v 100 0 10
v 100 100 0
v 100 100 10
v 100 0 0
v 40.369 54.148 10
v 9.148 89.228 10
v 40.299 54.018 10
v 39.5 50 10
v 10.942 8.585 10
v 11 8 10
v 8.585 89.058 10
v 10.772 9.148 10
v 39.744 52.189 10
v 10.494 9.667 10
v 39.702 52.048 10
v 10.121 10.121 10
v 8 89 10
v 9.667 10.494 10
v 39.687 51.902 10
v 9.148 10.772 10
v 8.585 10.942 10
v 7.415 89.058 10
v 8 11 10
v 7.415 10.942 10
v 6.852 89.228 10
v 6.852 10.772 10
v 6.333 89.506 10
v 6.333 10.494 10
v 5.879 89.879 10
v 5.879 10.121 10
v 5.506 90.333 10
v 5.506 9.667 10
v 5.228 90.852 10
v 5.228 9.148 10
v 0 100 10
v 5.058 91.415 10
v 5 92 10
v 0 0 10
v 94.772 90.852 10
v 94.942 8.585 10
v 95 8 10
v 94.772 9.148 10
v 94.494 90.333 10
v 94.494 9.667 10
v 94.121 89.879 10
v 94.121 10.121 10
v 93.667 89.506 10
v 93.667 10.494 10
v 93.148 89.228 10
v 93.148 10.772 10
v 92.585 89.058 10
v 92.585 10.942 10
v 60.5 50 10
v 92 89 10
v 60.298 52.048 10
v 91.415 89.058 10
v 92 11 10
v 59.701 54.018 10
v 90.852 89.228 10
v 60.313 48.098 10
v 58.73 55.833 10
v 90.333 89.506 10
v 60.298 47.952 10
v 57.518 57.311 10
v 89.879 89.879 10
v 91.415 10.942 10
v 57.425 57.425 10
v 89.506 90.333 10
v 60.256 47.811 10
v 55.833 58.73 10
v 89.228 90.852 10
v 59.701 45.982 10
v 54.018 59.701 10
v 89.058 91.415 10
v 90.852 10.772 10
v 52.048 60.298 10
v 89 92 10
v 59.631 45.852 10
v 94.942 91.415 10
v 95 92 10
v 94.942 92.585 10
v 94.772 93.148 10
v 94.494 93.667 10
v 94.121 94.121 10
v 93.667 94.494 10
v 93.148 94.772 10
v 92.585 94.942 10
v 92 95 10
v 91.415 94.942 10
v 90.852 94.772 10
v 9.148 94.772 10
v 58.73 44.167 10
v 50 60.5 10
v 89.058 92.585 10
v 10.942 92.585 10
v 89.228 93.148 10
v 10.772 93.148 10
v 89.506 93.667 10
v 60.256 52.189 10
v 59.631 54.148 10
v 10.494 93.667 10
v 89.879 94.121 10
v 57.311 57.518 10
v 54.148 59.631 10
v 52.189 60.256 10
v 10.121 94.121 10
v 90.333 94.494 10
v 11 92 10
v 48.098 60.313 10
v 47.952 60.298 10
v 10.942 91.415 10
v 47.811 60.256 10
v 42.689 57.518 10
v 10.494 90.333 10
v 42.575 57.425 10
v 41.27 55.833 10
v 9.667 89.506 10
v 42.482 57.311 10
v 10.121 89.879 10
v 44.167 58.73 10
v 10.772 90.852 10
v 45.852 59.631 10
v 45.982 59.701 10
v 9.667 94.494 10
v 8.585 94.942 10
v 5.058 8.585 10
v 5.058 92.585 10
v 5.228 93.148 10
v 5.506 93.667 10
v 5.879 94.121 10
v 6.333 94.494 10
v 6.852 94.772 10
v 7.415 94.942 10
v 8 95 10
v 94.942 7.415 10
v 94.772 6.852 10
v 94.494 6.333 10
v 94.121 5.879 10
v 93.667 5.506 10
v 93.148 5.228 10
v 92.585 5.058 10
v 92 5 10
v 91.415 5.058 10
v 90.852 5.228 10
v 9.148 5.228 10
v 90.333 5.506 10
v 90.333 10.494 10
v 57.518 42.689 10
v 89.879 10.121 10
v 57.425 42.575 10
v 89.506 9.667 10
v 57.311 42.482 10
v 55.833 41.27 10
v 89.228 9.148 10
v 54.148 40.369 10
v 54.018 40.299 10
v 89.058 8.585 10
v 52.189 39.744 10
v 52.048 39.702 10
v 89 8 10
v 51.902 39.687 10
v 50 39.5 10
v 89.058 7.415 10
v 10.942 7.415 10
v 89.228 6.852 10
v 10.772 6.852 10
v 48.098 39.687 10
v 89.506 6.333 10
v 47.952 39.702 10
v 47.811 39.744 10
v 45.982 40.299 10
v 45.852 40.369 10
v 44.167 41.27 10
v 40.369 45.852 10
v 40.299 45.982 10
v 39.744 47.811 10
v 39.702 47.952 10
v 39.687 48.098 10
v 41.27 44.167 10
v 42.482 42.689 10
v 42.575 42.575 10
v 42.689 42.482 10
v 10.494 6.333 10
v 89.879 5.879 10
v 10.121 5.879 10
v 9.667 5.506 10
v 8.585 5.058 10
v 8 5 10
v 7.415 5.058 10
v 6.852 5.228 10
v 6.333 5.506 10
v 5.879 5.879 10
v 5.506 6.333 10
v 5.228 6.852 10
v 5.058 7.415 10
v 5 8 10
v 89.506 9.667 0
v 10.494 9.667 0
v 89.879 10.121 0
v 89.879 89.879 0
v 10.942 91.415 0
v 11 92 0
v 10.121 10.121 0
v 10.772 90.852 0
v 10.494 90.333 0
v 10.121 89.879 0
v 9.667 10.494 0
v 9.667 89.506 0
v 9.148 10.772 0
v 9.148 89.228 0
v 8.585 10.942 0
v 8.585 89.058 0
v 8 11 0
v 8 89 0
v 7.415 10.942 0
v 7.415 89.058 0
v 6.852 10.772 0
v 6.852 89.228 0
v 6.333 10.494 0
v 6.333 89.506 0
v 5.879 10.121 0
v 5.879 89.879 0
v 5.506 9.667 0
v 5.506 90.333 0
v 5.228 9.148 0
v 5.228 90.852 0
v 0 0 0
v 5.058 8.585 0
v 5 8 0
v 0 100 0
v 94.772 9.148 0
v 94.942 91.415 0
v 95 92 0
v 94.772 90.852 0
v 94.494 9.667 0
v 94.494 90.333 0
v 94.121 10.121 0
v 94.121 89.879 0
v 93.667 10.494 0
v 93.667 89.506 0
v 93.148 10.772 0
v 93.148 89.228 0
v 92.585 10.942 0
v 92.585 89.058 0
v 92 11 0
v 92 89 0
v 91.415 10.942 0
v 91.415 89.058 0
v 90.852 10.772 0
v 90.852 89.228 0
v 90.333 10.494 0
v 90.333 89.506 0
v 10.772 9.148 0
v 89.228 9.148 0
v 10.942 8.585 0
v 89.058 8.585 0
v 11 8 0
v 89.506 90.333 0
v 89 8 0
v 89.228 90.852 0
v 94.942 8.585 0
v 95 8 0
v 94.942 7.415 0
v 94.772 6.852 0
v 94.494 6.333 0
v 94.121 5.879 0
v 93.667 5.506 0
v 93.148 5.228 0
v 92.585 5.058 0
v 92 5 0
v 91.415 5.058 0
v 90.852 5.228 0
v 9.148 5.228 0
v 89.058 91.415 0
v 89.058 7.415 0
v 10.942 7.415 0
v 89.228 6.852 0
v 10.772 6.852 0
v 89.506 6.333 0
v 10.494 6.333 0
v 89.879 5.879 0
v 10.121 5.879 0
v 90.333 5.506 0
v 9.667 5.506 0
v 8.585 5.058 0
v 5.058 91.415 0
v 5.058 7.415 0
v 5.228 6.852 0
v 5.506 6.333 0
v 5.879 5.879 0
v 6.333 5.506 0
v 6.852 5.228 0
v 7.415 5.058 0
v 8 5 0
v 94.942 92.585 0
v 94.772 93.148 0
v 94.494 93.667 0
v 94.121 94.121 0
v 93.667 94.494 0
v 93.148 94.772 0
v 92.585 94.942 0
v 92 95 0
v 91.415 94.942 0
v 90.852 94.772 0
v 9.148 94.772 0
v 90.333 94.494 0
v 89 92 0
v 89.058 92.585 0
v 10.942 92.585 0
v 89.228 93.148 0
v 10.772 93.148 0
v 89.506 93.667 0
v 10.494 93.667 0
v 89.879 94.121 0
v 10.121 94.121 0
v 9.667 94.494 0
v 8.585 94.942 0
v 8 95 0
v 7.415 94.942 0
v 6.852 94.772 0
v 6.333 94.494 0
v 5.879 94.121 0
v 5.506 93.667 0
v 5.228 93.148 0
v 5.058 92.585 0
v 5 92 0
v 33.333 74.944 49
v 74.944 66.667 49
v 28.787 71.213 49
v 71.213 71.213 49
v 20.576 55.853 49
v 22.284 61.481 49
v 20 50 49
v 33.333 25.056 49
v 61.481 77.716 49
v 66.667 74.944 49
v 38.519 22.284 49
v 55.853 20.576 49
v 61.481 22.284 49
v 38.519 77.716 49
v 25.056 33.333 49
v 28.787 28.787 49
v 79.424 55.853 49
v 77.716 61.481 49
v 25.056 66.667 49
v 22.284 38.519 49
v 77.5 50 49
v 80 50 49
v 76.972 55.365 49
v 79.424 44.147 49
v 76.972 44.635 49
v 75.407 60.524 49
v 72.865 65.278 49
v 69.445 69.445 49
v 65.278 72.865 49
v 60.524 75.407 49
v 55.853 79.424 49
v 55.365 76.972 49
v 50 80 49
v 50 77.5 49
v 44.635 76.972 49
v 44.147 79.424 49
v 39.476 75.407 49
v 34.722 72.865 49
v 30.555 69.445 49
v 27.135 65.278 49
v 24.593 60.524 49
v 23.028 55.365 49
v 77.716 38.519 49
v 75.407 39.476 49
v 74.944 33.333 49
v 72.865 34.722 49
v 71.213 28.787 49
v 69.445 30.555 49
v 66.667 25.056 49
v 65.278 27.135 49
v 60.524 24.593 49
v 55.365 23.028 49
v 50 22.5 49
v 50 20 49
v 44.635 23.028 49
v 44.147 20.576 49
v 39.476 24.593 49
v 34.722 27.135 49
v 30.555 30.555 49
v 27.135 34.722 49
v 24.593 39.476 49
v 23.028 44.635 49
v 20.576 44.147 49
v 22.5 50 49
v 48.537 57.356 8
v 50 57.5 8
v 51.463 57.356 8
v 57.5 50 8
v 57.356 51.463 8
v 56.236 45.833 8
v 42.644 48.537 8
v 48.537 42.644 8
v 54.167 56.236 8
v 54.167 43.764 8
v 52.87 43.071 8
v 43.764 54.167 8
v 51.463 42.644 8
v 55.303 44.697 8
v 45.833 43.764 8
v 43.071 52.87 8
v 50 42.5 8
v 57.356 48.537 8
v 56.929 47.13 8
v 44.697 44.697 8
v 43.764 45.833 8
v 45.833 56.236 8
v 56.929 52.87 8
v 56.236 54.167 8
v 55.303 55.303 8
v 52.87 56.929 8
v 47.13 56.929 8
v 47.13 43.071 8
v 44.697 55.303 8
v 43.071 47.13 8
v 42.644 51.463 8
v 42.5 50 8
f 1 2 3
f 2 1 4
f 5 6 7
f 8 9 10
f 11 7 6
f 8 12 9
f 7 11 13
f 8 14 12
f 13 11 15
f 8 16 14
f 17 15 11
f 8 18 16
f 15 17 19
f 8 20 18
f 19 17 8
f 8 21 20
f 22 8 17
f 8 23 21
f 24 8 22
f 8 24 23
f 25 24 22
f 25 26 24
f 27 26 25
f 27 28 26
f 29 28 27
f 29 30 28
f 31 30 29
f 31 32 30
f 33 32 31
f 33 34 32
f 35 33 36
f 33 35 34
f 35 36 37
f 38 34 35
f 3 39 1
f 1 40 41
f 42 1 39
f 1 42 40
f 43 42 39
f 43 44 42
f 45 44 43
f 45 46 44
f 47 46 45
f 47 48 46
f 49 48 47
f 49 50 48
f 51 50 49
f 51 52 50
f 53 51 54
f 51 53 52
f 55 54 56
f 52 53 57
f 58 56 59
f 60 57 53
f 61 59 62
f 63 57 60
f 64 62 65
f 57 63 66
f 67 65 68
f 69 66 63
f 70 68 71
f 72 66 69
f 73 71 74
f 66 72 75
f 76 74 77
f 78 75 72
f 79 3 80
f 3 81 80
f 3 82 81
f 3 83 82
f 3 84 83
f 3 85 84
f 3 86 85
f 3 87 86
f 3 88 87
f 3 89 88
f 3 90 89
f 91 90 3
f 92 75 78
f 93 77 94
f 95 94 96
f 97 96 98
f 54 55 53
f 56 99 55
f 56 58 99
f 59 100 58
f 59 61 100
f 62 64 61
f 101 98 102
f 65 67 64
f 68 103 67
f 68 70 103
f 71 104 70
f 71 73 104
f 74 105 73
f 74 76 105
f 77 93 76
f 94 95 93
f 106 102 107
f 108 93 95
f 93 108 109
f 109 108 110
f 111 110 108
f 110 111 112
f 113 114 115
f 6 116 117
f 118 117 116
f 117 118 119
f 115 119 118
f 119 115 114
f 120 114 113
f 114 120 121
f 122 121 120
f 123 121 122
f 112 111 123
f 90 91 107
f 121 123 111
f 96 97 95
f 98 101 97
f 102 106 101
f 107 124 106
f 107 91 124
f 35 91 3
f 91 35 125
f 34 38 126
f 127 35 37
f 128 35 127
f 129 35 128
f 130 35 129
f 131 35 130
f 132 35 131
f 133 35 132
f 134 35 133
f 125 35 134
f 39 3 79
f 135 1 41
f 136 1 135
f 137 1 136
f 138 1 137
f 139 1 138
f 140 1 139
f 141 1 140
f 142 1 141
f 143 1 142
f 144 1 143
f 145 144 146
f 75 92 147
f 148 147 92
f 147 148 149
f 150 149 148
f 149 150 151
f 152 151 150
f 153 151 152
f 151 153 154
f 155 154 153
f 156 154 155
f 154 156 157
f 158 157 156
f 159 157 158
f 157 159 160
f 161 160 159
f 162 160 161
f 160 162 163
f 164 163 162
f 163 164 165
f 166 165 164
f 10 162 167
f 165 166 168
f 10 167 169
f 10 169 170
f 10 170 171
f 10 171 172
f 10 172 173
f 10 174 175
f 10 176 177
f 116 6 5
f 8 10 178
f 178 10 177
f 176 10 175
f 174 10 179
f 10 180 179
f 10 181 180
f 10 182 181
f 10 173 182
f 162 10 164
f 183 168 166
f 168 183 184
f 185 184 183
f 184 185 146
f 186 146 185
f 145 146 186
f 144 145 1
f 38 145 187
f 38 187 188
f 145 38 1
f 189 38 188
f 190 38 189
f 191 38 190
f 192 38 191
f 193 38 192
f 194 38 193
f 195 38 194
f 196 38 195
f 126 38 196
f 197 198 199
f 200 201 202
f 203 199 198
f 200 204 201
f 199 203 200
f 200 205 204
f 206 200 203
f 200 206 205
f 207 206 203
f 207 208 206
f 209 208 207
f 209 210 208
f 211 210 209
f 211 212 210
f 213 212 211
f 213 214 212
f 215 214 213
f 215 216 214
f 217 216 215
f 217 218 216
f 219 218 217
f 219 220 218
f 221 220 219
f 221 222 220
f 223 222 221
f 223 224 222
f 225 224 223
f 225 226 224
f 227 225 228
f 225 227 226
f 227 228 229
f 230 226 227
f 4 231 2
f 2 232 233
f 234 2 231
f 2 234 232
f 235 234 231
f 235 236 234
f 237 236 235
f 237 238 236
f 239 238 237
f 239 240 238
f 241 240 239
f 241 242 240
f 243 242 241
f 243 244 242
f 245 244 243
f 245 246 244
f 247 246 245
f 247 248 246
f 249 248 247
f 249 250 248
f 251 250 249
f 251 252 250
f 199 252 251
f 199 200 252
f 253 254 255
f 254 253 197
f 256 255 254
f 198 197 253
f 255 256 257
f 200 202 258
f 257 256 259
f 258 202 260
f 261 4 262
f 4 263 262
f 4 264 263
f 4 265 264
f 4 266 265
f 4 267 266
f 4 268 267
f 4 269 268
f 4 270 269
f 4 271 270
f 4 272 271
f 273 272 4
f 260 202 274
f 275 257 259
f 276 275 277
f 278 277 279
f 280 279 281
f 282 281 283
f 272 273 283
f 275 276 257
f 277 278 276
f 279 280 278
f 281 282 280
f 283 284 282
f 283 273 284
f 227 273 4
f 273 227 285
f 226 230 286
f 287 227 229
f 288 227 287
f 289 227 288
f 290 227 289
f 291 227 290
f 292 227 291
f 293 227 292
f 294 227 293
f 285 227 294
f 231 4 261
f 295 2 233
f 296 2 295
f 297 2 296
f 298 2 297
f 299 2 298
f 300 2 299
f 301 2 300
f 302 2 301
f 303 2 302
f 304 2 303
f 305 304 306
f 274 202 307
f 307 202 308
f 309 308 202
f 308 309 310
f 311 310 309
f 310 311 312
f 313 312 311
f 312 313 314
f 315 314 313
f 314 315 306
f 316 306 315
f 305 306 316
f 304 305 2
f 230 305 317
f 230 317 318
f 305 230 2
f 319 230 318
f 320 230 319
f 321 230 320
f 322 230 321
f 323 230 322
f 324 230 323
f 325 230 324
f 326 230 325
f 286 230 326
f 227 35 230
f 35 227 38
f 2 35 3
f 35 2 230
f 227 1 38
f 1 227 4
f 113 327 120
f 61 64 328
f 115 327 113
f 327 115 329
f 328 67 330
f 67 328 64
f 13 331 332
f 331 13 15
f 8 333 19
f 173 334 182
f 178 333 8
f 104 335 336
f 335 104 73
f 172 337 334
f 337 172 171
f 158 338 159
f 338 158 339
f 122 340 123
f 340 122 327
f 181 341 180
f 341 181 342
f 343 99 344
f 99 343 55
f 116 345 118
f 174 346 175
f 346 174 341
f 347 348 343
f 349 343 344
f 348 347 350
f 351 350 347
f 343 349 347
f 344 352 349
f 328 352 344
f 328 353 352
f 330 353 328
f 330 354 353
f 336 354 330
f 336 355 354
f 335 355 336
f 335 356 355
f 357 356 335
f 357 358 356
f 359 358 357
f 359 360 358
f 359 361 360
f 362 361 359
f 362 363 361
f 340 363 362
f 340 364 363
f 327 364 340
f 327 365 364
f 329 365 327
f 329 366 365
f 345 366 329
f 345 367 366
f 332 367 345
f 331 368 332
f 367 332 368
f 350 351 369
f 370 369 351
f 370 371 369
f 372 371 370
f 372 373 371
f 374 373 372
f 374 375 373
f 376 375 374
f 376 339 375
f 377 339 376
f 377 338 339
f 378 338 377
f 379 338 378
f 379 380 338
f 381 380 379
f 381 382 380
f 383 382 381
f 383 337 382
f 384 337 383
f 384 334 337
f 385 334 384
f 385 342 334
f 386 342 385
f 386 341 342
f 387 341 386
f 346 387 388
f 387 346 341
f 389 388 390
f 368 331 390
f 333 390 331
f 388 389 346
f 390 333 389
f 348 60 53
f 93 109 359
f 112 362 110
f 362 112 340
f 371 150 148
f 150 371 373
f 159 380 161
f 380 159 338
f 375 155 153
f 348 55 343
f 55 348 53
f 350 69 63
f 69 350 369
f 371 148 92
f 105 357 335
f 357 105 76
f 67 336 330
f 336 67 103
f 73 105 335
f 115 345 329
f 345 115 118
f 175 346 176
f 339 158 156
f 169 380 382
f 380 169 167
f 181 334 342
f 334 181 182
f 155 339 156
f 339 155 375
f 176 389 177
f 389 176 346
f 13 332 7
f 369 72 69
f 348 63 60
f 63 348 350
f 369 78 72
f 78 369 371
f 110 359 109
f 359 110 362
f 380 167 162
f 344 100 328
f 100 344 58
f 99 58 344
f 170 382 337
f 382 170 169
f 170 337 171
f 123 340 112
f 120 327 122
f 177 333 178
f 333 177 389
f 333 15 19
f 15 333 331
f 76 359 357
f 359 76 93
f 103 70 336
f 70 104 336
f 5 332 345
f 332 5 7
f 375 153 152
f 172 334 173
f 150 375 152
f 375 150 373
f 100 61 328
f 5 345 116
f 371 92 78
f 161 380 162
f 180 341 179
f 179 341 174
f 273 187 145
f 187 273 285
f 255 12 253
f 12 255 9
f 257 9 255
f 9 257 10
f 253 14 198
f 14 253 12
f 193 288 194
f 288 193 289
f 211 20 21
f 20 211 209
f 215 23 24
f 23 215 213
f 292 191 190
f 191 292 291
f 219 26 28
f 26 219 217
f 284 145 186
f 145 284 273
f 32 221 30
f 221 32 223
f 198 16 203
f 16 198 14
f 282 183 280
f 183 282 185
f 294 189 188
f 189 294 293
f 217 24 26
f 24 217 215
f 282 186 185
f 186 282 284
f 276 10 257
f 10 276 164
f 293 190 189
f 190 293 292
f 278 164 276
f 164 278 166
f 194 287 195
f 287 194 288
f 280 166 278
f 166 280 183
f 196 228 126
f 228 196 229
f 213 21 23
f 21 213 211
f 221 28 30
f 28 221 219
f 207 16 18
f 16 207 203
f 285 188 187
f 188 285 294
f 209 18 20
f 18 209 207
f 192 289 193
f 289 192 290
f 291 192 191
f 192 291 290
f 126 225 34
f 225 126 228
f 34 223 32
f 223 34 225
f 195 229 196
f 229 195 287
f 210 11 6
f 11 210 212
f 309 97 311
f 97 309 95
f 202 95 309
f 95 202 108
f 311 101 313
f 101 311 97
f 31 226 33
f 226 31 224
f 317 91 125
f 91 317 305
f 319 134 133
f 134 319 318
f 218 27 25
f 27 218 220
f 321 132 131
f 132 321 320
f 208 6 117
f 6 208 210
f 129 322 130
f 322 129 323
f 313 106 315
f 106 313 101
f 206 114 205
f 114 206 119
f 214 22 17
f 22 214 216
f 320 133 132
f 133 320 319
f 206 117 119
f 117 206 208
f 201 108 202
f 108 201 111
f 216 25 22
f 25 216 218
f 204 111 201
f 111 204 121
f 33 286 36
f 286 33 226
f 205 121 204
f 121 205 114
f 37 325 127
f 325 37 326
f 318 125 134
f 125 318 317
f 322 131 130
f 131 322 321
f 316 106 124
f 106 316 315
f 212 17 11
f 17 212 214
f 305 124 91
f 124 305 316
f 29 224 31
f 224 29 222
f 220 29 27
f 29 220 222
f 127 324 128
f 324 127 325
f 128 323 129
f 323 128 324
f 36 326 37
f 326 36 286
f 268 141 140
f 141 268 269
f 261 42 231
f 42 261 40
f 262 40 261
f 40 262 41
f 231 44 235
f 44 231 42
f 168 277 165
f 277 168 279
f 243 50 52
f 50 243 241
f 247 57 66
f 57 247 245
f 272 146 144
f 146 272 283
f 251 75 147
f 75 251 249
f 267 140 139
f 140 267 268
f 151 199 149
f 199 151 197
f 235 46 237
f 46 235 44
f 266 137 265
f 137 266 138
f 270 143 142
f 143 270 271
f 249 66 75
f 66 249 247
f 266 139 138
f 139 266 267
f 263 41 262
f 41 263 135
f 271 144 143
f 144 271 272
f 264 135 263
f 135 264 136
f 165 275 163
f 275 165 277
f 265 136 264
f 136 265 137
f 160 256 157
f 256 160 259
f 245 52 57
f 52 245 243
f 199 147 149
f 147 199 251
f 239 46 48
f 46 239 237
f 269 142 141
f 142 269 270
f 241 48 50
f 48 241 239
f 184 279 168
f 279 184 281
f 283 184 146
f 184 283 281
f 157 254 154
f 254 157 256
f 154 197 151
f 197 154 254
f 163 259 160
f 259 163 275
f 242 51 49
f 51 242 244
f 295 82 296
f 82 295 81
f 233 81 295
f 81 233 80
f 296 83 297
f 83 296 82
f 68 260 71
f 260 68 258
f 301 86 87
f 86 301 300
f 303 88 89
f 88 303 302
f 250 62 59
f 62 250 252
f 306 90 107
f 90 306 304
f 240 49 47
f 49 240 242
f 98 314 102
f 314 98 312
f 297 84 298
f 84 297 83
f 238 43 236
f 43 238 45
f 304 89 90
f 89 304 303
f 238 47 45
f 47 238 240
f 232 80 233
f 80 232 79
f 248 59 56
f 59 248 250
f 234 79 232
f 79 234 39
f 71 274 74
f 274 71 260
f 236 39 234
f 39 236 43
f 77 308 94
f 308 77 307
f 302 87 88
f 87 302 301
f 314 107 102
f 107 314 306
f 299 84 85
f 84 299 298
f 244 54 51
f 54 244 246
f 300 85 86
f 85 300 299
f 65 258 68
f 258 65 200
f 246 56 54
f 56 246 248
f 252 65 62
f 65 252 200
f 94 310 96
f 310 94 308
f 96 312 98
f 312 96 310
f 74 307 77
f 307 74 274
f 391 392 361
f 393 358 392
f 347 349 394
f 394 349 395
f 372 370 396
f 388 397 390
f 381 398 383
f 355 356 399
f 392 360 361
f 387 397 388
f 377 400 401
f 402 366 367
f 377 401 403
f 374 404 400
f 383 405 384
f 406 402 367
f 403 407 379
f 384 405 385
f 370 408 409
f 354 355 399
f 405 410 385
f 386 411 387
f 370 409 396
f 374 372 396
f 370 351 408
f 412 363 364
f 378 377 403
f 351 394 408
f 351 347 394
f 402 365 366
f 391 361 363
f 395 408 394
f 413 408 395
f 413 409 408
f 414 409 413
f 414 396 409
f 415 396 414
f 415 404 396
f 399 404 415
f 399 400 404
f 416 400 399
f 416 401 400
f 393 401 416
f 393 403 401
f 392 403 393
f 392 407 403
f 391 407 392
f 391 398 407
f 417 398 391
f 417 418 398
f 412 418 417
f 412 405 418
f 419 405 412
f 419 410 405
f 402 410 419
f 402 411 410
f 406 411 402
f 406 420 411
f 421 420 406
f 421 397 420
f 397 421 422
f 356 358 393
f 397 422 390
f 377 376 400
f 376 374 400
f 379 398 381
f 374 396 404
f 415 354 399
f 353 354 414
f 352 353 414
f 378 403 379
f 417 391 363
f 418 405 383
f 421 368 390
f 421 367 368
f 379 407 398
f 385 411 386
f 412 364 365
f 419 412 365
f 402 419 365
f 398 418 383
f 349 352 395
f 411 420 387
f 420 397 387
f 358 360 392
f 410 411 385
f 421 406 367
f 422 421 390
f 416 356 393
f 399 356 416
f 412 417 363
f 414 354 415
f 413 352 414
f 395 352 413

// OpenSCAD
$fn = 32;

// ----------------------------------------------------------------------
// Hopper: flanged with square flange
// ----------------------------------------------------------------------

// --- parameters (mm) ---
fl = 100;                 // flange side, X and Y
fl_t = 10;                // flange thickness
cone_h = 40;              // cone height above the flange
top_d = 60;               // cone mouth diameter
bot_d = 20;               // cone spout diameter
wall = 2.5;               // cone wall thickness
hole_r = 3;               // flange hole radius
hole_in = 8;              // hole inset from the corners

bore_d = bot_d - 2 * wall;  // spout bore diameter
total_h = fl_t + cone_h - 1;  // overall height

difference() {
  union() {
    cube([fl, fl, fl_t]);
    translate([fl / 2, fl / 2, fl_t - 1])
      cylinder(h = cone_h, d1 = bot_d, d2 = top_d);
  }
  translate([fl / 2, fl / 2, fl_t - 2])
    cylinder(h = cone_h + 1, d1 = bore_d, d2 = top_d - 2 * wall);
  for (sx = [0, 1], sy = [0, 1])
    translate([sx ? fl - hole_in : hole_in,
               sy ? fl - hole_in : hole_in, -1])
      cylinder(r = hole_r, h = fl_t + 2);
}
